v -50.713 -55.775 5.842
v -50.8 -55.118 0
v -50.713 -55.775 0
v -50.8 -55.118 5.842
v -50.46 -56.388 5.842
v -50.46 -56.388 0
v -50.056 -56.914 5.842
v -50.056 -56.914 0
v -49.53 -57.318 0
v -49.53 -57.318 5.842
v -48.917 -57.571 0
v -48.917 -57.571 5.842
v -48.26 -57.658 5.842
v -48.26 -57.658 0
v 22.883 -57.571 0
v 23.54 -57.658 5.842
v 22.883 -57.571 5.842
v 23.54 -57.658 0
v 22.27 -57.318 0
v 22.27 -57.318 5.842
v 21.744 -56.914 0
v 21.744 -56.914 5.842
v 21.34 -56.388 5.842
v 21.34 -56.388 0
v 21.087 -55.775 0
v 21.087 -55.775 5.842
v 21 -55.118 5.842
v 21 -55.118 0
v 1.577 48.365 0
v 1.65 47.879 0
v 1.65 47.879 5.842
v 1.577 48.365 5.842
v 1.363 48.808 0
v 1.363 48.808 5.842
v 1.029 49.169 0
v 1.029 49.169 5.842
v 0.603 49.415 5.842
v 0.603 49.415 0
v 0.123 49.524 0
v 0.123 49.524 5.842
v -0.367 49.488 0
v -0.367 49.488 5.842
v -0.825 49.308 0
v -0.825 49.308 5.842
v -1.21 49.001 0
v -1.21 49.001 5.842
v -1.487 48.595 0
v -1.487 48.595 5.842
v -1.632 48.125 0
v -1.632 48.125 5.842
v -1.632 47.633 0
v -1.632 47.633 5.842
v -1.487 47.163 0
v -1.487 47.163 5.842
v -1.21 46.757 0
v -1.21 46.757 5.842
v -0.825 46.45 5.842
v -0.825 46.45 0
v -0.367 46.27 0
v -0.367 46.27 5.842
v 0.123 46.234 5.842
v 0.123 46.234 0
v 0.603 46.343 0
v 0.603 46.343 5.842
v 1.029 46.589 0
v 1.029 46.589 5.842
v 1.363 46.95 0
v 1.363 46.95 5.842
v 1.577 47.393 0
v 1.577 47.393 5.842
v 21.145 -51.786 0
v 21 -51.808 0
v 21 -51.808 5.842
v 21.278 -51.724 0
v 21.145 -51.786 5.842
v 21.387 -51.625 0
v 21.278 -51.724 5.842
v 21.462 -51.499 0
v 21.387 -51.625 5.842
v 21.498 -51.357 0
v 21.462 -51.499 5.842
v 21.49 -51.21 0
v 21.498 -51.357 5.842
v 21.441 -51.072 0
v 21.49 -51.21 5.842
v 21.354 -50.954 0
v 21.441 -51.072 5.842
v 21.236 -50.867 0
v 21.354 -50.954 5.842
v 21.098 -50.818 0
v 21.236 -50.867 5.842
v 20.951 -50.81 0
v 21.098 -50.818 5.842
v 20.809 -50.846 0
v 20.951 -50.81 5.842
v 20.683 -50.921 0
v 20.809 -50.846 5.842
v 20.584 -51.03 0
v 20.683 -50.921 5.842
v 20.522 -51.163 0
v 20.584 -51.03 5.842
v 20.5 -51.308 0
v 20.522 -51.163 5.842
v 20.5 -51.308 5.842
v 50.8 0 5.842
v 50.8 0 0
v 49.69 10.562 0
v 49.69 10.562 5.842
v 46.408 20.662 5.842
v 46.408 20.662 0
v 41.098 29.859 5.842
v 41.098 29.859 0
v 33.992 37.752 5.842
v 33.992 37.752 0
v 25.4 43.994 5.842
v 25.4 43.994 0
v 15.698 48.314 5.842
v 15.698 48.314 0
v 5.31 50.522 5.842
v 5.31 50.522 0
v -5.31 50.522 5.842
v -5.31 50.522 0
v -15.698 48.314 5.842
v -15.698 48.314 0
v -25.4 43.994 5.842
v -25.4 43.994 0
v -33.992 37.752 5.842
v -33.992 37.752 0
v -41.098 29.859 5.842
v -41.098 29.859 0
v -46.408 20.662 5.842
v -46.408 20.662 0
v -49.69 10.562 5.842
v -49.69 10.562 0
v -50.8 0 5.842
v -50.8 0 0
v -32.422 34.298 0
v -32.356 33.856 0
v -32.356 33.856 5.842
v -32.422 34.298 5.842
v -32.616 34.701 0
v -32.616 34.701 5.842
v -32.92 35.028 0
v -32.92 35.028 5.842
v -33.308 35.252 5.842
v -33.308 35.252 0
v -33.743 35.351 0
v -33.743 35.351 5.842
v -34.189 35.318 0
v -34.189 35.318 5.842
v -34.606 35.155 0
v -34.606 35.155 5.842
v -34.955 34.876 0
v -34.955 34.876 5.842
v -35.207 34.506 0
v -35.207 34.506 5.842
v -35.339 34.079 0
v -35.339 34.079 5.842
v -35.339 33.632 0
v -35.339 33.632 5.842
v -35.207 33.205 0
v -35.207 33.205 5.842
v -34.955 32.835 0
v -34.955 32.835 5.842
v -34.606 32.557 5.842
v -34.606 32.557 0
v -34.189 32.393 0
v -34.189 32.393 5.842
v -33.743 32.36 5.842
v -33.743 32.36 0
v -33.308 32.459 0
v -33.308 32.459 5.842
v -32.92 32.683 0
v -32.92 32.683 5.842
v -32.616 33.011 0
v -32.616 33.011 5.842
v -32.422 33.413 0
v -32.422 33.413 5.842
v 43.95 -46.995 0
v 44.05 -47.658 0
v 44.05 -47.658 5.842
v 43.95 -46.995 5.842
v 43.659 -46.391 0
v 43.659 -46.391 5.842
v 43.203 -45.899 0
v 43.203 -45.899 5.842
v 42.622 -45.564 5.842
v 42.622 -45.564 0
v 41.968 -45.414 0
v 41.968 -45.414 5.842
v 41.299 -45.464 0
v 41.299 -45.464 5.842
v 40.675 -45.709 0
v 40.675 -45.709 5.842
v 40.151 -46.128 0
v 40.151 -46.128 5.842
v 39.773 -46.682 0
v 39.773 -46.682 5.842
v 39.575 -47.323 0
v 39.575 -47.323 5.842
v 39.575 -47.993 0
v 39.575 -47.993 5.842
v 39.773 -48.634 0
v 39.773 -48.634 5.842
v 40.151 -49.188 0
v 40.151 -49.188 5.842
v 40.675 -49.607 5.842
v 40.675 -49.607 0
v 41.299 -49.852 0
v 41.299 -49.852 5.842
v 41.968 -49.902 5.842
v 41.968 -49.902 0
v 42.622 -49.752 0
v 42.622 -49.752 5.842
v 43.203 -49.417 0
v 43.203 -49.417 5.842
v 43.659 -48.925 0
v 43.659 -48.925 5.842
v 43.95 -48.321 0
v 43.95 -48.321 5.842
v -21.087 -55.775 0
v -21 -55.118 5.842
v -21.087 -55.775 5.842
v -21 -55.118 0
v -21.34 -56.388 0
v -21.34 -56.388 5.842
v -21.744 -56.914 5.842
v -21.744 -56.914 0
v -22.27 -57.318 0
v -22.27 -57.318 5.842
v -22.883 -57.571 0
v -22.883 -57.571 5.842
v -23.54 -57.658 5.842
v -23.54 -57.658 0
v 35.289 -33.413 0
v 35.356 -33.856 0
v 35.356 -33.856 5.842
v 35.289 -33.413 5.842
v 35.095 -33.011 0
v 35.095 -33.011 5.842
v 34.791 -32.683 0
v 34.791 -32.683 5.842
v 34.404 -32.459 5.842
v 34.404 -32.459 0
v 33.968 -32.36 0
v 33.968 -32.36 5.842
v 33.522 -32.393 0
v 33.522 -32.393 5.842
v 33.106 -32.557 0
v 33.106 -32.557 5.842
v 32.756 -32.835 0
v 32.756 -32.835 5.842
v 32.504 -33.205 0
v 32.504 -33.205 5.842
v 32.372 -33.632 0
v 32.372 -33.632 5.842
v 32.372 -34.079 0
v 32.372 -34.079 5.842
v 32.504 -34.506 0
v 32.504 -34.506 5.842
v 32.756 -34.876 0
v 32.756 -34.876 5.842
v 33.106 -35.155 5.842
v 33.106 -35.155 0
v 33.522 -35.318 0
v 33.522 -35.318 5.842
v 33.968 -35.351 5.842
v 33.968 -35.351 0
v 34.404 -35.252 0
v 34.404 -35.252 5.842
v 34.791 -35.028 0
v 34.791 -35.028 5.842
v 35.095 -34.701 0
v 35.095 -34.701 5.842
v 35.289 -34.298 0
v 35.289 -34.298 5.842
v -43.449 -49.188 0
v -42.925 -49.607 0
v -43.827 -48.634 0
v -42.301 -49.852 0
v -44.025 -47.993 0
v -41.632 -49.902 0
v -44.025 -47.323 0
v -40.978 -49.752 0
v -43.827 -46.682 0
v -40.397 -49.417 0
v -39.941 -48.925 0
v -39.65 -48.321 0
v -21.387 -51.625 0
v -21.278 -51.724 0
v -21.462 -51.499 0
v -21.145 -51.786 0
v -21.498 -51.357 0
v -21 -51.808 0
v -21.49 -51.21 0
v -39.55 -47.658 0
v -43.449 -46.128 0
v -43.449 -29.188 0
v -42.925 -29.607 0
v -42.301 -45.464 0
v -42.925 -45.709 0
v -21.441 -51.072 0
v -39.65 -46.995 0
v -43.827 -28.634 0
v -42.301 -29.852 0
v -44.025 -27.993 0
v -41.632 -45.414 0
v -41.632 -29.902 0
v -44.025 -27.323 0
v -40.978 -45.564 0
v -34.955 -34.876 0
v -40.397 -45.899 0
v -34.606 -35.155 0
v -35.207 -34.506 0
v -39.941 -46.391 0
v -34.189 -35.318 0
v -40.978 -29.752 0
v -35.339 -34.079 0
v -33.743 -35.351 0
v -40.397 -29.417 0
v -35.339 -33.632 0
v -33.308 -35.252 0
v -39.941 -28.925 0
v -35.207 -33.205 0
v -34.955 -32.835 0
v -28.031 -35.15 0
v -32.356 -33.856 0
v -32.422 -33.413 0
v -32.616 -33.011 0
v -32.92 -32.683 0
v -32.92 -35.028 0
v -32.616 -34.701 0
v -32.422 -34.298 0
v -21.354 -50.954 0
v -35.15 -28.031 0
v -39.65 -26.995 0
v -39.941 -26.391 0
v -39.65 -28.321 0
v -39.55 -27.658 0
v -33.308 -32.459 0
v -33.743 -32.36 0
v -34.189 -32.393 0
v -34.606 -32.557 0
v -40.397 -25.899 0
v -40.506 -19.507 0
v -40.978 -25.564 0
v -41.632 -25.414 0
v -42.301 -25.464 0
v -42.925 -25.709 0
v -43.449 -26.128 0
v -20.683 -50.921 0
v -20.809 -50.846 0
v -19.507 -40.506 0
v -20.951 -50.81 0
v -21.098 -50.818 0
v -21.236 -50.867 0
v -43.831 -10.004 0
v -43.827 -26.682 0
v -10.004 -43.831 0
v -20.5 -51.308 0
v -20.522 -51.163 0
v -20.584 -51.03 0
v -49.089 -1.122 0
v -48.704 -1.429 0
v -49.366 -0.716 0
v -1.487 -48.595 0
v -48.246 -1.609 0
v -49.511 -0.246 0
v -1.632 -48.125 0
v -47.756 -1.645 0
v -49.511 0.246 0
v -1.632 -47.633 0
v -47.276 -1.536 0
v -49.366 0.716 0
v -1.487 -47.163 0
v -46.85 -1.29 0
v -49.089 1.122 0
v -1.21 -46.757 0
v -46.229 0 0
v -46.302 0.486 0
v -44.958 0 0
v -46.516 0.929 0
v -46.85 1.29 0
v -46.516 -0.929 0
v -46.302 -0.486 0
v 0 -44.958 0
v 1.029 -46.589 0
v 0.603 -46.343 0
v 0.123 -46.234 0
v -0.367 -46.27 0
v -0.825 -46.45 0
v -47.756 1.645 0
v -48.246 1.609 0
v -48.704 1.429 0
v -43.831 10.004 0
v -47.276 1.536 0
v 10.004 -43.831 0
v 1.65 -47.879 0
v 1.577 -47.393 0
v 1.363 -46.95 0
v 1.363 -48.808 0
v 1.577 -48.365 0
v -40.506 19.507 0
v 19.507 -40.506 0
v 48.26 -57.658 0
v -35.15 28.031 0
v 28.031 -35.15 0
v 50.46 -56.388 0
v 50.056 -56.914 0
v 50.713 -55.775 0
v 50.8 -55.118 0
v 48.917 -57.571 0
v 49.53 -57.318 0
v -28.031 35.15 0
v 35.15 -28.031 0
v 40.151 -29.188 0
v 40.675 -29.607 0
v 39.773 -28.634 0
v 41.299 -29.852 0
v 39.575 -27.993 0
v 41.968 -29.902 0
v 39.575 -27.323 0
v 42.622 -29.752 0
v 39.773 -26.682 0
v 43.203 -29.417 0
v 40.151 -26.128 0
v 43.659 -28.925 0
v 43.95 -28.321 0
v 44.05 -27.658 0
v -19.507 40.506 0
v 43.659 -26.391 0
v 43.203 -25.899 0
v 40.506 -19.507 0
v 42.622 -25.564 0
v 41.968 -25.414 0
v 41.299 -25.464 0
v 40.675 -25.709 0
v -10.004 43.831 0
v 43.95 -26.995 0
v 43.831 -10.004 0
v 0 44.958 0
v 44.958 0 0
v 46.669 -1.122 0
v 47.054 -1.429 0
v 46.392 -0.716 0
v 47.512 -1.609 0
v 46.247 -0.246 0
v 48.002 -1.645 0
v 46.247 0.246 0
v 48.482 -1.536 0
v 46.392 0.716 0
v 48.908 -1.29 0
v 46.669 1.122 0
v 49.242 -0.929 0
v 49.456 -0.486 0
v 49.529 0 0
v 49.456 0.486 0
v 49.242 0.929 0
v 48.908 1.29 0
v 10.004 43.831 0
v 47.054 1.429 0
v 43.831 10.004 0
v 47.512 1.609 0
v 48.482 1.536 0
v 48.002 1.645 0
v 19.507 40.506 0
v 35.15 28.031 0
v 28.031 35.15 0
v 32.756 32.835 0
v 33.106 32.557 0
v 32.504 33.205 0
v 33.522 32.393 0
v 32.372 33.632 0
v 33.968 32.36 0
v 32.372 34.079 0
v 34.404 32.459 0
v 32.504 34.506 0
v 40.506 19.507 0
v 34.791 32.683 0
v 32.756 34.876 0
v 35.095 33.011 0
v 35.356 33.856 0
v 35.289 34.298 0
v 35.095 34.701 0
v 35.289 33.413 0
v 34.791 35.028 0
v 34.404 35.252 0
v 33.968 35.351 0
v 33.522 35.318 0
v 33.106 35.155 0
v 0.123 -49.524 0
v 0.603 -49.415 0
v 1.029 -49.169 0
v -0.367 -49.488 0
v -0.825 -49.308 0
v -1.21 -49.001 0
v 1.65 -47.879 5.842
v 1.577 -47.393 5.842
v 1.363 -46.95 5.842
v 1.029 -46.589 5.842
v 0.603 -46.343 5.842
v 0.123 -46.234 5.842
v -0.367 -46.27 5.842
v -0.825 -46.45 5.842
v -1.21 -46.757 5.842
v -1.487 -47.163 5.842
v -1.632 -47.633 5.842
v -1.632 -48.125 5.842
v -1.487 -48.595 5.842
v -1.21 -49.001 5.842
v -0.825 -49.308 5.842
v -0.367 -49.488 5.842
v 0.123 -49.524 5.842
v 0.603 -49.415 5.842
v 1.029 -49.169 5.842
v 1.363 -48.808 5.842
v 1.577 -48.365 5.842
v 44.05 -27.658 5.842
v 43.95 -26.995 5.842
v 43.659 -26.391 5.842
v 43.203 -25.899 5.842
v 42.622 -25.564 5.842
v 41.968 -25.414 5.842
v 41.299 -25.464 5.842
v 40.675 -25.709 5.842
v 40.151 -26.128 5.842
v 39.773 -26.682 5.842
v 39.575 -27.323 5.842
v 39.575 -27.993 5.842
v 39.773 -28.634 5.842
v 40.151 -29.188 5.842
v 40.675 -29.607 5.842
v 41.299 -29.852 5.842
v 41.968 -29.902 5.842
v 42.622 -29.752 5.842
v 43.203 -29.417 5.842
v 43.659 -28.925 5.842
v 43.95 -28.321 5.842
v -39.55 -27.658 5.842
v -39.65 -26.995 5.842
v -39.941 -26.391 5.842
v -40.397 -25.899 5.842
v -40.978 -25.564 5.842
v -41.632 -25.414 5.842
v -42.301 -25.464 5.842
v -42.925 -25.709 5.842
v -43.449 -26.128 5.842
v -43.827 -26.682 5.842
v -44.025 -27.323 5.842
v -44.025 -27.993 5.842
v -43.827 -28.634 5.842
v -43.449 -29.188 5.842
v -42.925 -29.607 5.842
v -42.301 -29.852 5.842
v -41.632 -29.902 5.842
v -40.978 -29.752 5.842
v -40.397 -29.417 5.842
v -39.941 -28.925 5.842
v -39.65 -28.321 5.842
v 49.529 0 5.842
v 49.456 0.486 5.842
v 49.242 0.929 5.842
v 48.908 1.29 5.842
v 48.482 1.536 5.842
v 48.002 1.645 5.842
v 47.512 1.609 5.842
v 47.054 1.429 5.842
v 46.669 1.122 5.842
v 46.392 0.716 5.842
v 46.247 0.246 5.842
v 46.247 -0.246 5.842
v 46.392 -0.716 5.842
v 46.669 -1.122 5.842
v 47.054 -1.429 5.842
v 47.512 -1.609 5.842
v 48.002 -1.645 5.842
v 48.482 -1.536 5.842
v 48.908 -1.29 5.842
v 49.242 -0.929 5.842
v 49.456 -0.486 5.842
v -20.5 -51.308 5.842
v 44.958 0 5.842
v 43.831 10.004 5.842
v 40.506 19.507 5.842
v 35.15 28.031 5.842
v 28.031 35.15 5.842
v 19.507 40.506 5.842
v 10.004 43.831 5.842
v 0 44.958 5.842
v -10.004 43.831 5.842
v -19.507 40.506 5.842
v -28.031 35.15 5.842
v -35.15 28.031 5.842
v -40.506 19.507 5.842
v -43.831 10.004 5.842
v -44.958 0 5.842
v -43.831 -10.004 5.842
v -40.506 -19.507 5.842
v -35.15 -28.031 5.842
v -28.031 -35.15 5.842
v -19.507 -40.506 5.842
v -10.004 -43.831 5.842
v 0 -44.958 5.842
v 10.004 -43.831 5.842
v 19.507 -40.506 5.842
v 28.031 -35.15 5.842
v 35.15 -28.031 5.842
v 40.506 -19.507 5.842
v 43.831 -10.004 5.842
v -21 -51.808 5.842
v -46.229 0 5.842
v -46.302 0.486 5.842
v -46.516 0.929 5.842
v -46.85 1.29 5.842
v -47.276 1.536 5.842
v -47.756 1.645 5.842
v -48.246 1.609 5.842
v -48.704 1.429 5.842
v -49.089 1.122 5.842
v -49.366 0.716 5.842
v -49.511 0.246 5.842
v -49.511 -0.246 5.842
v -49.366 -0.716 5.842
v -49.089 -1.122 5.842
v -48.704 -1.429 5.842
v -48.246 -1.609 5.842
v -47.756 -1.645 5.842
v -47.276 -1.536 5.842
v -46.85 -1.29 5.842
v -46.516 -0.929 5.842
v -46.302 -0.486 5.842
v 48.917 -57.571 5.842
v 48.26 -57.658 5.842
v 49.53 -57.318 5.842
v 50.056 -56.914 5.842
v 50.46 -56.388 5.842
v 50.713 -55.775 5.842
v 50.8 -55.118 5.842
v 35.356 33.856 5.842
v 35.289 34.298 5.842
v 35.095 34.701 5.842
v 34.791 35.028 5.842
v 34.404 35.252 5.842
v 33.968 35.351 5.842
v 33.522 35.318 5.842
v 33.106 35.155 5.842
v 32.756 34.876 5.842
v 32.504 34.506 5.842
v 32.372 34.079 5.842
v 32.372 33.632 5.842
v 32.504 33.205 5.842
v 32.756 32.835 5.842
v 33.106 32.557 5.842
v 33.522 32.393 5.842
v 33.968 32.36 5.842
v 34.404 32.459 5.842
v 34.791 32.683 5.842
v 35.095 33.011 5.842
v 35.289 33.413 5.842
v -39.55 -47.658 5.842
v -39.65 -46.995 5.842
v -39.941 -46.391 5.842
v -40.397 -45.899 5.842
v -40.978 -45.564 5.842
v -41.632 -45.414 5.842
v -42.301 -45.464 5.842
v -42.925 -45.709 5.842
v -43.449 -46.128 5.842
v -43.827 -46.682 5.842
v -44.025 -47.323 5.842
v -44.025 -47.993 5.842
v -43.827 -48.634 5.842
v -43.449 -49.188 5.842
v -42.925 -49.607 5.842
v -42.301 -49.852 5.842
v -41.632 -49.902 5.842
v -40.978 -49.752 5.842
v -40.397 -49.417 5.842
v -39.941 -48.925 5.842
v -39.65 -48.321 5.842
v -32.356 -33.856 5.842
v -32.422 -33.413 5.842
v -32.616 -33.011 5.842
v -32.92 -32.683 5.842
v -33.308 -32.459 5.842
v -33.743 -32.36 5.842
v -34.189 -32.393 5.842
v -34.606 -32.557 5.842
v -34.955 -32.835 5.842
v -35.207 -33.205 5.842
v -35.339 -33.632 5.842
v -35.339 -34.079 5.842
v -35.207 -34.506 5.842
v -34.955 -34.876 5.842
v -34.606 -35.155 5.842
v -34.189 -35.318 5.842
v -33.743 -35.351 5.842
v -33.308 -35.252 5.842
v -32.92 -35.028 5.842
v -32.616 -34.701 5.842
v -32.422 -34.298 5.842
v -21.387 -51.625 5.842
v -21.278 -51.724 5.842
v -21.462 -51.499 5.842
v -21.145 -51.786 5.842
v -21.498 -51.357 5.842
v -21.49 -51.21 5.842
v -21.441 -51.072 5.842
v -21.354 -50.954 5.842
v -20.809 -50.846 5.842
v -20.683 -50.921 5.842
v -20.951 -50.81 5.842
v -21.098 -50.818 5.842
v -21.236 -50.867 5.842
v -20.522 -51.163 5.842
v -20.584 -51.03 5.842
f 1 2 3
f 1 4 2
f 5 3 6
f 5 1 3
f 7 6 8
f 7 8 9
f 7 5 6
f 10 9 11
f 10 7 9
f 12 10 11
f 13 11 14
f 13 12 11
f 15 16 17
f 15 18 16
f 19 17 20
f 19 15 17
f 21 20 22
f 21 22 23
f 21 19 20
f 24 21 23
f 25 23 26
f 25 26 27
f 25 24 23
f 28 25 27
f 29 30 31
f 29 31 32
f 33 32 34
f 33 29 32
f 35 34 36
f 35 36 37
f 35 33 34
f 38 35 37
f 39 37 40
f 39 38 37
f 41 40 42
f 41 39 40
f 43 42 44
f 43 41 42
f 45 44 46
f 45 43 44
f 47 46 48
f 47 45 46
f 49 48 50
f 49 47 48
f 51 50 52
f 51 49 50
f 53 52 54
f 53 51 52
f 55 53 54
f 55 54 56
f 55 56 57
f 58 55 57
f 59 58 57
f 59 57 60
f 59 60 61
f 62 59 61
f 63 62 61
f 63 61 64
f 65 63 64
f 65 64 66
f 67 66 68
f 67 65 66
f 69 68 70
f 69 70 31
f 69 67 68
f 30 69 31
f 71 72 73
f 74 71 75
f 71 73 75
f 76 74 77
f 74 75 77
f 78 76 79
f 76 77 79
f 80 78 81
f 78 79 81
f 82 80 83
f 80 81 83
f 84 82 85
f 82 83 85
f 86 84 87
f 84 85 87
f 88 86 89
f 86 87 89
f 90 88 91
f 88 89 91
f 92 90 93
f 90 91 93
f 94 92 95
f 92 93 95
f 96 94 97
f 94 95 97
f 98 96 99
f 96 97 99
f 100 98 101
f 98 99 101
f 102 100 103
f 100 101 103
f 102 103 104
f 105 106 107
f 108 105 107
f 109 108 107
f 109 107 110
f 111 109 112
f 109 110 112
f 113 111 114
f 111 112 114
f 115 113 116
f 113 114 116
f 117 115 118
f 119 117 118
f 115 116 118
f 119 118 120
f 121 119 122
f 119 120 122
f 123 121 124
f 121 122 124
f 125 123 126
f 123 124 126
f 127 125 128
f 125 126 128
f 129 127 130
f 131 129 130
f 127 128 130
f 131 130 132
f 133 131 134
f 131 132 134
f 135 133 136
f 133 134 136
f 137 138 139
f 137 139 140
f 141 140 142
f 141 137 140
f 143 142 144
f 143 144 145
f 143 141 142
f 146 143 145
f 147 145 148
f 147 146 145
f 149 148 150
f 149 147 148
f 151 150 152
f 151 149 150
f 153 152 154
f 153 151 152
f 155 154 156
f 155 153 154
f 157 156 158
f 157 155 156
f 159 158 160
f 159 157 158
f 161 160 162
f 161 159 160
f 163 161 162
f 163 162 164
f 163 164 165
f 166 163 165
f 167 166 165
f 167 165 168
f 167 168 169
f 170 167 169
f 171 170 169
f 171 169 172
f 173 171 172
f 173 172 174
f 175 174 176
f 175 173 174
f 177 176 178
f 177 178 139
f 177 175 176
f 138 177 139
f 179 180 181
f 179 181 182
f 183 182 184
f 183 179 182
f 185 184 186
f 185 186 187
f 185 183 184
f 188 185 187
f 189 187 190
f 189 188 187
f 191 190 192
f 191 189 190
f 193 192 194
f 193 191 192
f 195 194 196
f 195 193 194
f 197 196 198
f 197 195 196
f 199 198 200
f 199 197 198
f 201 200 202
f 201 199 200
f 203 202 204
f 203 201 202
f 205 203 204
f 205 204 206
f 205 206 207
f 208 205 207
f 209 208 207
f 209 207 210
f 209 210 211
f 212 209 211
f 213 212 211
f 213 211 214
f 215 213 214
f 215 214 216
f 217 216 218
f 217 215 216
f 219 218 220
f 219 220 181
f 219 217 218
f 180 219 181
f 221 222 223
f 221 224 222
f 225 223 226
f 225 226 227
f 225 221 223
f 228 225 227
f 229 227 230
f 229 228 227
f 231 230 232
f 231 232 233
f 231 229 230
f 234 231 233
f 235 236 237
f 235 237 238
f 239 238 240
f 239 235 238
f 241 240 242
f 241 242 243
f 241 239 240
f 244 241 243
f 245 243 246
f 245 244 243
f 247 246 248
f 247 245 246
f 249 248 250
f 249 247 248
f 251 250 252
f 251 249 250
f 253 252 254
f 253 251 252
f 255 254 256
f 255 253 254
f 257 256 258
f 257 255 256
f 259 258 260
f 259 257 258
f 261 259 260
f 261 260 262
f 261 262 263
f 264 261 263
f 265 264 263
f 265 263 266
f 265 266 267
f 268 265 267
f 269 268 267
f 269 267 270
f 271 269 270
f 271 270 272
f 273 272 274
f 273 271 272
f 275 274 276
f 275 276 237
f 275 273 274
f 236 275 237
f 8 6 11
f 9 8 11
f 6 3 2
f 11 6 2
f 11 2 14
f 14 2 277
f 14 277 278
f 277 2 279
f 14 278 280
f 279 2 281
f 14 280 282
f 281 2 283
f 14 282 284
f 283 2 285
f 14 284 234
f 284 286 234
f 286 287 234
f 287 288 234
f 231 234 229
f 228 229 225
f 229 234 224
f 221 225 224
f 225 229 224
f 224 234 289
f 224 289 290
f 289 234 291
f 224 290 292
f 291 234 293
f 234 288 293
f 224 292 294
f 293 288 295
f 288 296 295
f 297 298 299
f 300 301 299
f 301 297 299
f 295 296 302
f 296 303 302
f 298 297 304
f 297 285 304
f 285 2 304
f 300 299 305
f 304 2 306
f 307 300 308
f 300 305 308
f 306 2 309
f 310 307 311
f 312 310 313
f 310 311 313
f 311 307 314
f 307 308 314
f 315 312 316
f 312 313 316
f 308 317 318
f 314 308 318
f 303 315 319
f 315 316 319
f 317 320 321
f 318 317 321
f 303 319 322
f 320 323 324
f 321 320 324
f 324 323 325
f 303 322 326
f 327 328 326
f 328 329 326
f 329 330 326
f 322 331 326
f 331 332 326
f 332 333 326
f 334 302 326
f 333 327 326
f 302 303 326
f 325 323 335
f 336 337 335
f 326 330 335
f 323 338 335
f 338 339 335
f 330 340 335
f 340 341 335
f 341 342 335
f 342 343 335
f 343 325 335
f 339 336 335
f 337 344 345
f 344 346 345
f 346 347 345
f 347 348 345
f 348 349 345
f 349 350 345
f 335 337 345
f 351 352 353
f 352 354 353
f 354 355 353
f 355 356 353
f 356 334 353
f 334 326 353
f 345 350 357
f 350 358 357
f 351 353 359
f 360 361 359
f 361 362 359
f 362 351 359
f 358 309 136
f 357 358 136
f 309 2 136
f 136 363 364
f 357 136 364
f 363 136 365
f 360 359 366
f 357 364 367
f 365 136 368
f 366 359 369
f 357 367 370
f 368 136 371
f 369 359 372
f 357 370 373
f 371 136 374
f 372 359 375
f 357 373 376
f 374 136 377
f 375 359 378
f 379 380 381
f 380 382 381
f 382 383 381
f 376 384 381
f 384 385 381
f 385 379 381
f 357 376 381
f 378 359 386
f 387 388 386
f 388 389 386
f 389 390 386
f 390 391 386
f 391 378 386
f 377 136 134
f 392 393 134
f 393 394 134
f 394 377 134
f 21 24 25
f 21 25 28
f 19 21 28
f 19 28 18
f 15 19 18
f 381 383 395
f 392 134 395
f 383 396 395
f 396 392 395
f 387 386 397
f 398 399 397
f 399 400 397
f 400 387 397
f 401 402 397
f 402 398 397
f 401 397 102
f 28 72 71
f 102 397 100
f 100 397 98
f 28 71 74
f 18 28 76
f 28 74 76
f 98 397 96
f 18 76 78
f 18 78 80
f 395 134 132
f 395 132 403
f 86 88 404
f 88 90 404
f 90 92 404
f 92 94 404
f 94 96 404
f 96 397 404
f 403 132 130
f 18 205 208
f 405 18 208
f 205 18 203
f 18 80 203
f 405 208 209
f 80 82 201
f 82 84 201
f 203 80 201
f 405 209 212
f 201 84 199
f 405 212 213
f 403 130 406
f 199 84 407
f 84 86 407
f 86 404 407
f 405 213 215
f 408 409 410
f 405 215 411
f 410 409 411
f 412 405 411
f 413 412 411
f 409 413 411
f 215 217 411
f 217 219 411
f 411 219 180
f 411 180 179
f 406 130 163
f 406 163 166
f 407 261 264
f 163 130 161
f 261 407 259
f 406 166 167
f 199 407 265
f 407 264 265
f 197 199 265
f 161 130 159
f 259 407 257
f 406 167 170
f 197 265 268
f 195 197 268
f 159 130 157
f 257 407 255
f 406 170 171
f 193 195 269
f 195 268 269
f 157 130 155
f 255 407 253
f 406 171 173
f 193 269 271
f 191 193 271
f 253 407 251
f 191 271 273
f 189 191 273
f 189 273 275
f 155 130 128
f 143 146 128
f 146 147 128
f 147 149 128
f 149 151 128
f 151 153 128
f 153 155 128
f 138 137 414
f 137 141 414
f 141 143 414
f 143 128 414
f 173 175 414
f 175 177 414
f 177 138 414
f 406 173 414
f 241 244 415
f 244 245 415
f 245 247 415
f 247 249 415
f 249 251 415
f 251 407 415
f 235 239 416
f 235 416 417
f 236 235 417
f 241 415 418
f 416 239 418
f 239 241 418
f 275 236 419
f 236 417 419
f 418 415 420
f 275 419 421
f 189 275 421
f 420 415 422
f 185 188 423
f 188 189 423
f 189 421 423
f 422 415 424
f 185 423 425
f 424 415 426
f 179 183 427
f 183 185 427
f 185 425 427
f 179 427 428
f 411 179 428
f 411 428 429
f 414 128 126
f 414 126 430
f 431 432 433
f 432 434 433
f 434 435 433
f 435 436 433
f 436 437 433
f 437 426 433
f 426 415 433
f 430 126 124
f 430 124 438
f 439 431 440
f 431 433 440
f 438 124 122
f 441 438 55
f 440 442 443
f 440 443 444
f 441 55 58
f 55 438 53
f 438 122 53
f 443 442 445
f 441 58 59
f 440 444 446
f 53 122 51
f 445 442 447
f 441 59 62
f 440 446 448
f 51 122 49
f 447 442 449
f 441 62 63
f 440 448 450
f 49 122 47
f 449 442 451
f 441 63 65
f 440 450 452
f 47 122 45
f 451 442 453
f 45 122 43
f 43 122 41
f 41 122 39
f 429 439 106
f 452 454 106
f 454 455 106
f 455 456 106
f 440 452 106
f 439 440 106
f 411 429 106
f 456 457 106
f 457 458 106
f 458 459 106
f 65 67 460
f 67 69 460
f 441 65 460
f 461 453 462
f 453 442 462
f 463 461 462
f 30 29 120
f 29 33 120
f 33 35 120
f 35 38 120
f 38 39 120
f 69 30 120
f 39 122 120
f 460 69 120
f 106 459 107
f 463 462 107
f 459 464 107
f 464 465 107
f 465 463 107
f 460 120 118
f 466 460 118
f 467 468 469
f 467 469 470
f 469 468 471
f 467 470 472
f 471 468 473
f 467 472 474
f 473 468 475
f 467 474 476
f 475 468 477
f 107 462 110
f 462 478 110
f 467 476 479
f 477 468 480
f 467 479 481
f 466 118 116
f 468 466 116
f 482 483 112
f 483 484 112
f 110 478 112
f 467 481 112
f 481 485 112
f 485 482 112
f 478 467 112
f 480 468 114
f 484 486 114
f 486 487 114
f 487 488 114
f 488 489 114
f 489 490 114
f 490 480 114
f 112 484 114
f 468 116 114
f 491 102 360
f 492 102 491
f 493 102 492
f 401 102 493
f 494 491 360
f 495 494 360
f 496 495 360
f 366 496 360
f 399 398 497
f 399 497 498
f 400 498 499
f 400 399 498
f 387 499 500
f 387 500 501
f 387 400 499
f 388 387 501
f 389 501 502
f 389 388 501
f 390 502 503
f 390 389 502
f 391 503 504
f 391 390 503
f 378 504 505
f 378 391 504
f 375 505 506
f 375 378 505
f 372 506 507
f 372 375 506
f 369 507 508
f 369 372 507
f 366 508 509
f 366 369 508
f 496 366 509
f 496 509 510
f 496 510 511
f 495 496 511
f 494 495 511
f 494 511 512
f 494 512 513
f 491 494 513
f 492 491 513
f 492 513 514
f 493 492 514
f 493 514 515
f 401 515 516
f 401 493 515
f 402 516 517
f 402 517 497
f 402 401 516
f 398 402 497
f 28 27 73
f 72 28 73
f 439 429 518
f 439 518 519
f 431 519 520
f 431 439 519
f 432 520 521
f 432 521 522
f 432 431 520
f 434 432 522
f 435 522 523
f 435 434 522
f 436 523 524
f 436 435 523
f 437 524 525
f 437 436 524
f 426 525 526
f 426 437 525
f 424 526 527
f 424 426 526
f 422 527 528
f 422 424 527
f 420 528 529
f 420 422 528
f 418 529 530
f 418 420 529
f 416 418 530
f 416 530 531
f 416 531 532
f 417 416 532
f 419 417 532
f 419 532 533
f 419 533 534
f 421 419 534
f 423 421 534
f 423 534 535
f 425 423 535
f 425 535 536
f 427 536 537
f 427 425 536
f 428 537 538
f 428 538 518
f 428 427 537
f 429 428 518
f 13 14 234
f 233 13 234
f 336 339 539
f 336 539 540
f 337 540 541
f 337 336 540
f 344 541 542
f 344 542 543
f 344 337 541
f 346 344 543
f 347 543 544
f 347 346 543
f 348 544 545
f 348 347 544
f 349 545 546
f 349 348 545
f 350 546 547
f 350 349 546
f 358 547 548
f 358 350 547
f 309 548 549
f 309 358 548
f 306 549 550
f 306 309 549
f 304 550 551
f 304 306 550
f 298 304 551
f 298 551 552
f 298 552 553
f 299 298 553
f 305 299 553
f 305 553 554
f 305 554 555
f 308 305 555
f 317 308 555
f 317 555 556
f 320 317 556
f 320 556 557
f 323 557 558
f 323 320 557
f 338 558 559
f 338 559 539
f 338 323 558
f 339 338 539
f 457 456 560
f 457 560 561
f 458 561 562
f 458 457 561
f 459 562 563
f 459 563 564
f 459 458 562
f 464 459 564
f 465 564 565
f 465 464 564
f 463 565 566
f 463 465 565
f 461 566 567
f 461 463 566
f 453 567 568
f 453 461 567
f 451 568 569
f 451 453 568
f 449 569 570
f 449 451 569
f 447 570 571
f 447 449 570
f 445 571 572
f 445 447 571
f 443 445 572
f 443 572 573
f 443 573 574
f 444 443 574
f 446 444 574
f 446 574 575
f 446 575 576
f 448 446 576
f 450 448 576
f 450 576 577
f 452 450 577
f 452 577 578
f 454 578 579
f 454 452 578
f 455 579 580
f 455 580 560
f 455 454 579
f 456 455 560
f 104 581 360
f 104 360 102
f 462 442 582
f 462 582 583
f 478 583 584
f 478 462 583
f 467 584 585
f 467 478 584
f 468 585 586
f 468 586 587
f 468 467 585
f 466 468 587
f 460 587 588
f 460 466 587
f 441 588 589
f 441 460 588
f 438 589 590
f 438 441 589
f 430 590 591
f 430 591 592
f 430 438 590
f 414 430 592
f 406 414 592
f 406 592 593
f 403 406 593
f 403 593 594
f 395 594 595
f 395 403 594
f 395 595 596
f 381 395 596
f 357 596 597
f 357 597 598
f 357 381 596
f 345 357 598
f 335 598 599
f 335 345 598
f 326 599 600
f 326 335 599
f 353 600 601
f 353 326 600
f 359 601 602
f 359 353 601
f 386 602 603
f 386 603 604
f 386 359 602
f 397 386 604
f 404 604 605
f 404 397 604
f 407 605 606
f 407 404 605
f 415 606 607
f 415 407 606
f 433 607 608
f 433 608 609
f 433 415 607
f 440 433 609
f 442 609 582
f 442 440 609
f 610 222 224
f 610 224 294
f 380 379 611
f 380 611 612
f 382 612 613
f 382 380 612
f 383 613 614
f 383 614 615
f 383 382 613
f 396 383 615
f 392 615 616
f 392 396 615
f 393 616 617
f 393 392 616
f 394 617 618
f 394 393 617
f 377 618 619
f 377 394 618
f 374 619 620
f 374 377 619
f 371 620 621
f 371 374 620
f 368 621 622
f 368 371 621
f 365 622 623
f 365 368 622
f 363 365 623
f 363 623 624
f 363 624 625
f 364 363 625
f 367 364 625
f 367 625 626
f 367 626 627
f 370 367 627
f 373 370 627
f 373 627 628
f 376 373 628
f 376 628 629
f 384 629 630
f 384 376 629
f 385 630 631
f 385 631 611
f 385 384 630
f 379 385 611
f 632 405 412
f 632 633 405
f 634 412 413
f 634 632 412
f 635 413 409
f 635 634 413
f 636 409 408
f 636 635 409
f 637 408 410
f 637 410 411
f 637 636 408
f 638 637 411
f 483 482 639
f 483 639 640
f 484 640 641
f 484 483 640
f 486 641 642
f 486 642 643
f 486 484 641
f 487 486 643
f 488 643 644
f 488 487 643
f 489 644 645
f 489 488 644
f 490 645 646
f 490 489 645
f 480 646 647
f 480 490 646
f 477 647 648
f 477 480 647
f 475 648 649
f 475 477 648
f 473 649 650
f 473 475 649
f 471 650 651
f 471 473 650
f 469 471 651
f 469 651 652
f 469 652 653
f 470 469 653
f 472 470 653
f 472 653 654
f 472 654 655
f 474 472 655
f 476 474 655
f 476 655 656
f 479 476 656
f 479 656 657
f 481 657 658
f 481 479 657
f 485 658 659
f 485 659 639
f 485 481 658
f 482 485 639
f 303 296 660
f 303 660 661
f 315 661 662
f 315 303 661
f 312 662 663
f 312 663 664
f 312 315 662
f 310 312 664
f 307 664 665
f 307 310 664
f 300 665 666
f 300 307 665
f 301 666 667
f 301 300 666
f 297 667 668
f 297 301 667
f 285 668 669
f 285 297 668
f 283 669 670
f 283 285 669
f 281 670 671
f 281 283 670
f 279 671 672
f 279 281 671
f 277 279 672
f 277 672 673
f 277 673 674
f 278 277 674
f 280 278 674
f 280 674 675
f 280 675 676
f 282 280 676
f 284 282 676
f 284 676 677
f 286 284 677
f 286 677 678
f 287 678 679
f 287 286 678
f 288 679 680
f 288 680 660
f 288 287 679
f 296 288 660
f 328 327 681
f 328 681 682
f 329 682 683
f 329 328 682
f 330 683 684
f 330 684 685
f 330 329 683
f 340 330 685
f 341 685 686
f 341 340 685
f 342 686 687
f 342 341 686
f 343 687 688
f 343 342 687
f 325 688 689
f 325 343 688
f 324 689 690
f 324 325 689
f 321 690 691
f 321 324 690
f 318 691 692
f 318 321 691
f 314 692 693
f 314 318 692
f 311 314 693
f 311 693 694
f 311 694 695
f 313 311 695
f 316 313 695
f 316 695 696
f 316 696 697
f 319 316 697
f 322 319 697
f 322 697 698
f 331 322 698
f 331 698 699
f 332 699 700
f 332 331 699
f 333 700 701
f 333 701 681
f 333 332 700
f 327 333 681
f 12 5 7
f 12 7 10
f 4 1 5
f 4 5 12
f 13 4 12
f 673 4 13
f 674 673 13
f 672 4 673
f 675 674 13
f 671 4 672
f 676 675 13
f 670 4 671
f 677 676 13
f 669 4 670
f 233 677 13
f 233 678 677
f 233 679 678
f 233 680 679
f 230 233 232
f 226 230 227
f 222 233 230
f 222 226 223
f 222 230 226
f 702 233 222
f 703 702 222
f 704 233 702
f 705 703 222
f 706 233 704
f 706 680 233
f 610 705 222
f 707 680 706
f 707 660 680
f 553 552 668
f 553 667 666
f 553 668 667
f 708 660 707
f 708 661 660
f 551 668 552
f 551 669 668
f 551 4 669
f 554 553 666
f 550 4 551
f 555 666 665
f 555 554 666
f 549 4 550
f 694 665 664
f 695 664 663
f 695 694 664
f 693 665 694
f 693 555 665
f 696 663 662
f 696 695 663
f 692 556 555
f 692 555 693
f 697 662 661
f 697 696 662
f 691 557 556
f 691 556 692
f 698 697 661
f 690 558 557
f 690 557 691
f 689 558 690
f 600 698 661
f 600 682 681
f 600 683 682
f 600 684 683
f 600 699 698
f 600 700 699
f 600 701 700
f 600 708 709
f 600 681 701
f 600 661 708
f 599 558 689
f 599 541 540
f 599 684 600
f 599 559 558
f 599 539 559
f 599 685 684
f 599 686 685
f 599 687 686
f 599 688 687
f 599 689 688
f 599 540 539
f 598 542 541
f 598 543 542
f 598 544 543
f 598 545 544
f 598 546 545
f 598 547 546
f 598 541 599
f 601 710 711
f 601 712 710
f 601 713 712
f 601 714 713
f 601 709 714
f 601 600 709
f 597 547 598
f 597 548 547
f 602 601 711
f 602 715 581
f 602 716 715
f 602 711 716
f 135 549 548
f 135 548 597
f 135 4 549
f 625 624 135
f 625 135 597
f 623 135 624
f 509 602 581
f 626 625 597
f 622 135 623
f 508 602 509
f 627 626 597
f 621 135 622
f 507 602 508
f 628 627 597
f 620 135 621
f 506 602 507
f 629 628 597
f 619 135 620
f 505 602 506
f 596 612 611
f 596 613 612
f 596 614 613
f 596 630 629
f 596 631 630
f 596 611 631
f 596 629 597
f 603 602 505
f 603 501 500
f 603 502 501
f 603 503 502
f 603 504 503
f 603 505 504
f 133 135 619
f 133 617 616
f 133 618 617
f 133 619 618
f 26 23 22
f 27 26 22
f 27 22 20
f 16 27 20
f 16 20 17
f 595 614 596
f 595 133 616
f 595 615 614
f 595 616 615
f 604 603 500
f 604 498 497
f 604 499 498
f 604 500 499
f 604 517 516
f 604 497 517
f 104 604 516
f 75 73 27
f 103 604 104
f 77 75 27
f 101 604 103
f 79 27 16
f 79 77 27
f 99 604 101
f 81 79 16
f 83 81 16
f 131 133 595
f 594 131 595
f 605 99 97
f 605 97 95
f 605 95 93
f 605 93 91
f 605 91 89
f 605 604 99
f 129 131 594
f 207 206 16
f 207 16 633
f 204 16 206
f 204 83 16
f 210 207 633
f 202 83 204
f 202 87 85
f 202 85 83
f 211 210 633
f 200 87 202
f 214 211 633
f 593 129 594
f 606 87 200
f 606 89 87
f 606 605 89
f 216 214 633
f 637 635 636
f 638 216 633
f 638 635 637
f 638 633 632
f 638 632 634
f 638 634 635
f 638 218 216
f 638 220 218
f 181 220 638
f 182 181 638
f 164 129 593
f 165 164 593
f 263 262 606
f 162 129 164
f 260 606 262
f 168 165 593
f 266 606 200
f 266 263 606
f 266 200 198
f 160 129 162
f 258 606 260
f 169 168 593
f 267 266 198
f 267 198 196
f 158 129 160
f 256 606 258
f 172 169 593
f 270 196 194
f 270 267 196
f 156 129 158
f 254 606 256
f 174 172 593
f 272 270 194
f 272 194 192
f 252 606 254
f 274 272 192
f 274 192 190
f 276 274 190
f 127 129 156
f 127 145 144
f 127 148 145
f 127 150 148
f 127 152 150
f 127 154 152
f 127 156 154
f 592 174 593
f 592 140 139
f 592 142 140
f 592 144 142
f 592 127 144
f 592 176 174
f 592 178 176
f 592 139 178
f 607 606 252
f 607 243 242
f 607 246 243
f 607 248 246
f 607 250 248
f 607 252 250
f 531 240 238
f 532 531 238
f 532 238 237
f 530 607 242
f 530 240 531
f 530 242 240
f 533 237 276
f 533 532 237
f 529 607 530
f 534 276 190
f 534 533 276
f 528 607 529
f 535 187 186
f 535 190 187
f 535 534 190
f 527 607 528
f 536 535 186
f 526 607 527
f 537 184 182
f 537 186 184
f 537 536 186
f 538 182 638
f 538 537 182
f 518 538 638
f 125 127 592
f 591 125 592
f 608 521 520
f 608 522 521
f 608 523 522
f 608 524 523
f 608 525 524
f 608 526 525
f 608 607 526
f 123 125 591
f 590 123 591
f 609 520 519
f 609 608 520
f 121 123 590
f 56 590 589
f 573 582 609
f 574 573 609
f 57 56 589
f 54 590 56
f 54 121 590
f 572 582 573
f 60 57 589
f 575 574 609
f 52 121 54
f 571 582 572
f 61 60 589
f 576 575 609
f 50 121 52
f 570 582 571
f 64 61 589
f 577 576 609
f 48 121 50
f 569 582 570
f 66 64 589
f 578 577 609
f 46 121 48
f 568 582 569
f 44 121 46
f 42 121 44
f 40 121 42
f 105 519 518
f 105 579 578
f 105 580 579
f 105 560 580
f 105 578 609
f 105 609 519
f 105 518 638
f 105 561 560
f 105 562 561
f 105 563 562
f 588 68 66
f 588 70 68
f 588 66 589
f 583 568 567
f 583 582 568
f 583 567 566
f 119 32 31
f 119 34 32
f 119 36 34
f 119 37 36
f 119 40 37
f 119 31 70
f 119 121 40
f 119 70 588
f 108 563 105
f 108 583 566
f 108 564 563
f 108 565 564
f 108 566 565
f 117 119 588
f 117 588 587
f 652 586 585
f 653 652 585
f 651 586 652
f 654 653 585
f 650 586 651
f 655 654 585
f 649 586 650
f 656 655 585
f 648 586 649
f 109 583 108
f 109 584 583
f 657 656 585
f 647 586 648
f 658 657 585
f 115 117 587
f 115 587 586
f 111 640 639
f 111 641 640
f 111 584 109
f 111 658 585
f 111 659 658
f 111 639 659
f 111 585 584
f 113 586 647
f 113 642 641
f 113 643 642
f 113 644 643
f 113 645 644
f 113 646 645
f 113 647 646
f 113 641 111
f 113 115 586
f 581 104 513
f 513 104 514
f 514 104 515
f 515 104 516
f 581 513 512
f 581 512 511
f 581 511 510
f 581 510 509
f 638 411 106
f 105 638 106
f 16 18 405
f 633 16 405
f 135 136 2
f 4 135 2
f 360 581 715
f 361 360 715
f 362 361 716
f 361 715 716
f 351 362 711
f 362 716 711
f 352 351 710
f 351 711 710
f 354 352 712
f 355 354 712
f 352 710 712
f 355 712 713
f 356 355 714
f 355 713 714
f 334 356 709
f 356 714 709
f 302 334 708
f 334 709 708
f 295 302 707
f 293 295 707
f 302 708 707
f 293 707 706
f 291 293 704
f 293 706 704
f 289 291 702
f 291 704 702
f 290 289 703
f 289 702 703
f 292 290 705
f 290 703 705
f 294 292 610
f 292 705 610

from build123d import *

# Parameters (mm, degrees)
SKETCH1_R           = 2.25
SKETCH1_R_2         = 44.958
SKETCH1_R_3         = 1.65
SKETCH1_R_4         = 1.5
BOSS_EXTRUDE1_DEPTH = 5.842
SKETCH2_W           = 42
SKETCH2_H           = 6.35
CUT_EXTRUDE1_DEPTH  = 78.066295668
SKETCH3_R           = 0.5
CUT_EXTRUDE2_DEPTH  = 78.066295668
FILLET1_R           = 2.54


with BuildPart() as part:
    # Sketch1 → Boss-Extrude1 (new body)
    with BuildSketch(Plane.XY):
        with BuildLine():
            Line((-50.8, 0), (-50.8, -57.658))
            Line((-50.8, -57.658), (50.8, -57.658))
            Line((50.8, -57.658), (50.8, 0))
            ThreePointArc((50.8, 0), (0, 50.8), (-50.8, 0))
        make_face()
        with Locations((41.8, -47.658)):
            Circle(SKETCH1_R, mode=Mode.SUBTRACT)
        Circle(SKETCH1_R_2, mode=Mode.SUBTRACT)
        with Locations((-47.879, 0)):
            Circle(SKETCH1_R_3, mode=Mode.SUBTRACT)
        with Locations((0, 47.879)):
            Circle(SKETCH1_R_3, mode=Mode.SUBTRACT)
        with Locations((41.8, -27.658)):
            Circle(SKETCH1_R, mode=Mode.SUBTRACT)
        with Locations((47.879, 0)):
            Circle(SKETCH1_R_3, mode=Mode.SUBTRACT)
        with Locations((0, -47.879)):
            Circle(SKETCH1_R_3, mode=Mode.SUBTRACT)
        with Locations((-41.8, -27.658)):
            Circle(SKETCH1_R, mode=Mode.SUBTRACT)
        with Locations((-33.855565576, 33.855565576)):
            Circle(SKETCH1_R_4, mode=Mode.SUBTRACT)
        with Locations((33.855565576, 33.855565576)):
            Circle(SKETCH1_R_4, mode=Mode.SUBTRACT)
        with Locations((33.855565576, -33.855565576)):
            Circle(SKETCH1_R_4, mode=Mode.SUBTRACT)
        with Locations((-33.855565576, -33.855565576)):
            Circle(SKETCH1_R_4, mode=Mode.SUBTRACT)
        with Locations((-41.8, -47.658)):
            Circle(SKETCH1_R, mode=Mode.SUBTRACT)
    extrude(amount=BOSS_EXTRUDE1_DEPTH)

    # Sketch2 → Cut-Extrude1 (cut, through all)
    with BuildSketch(Plane.XY.offset(5.842)):
        with Locations((0, -54.483)):
            Rectangle(SKETCH2_W, SKETCH2_H)
    extrude(amount=-CUT_EXTRUDE1_DEPTH, mode=Mode.SUBTRACT)

    # Sketch3 → Cut-Extrude2 (cut, through all)
    with BuildSketch(Plane.XY.offset(5.842)):
        with Locations((-21, -51.308)):
            Circle(SKETCH3_R)
        with Locations((21, -51.308)):
            Circle(SKETCH3_R)
    extrude(amount=-CUT_EXTRUDE2_DEPTH, mode=Mode.SUBTRACT)

    # Fillet1
    fillet1_edges = [part.edges().sort_by_distance(p)[0] for p in [
        (50.8, -57.658, 2.921),
        (-50.8, -57.658, 2.921),
        (-21, -57.658, 2.921),
        (21, -57.658, 2.921),
    ]]
    fillet(fillet1_edges, radius=FILLET1_R)


solid = part.part
